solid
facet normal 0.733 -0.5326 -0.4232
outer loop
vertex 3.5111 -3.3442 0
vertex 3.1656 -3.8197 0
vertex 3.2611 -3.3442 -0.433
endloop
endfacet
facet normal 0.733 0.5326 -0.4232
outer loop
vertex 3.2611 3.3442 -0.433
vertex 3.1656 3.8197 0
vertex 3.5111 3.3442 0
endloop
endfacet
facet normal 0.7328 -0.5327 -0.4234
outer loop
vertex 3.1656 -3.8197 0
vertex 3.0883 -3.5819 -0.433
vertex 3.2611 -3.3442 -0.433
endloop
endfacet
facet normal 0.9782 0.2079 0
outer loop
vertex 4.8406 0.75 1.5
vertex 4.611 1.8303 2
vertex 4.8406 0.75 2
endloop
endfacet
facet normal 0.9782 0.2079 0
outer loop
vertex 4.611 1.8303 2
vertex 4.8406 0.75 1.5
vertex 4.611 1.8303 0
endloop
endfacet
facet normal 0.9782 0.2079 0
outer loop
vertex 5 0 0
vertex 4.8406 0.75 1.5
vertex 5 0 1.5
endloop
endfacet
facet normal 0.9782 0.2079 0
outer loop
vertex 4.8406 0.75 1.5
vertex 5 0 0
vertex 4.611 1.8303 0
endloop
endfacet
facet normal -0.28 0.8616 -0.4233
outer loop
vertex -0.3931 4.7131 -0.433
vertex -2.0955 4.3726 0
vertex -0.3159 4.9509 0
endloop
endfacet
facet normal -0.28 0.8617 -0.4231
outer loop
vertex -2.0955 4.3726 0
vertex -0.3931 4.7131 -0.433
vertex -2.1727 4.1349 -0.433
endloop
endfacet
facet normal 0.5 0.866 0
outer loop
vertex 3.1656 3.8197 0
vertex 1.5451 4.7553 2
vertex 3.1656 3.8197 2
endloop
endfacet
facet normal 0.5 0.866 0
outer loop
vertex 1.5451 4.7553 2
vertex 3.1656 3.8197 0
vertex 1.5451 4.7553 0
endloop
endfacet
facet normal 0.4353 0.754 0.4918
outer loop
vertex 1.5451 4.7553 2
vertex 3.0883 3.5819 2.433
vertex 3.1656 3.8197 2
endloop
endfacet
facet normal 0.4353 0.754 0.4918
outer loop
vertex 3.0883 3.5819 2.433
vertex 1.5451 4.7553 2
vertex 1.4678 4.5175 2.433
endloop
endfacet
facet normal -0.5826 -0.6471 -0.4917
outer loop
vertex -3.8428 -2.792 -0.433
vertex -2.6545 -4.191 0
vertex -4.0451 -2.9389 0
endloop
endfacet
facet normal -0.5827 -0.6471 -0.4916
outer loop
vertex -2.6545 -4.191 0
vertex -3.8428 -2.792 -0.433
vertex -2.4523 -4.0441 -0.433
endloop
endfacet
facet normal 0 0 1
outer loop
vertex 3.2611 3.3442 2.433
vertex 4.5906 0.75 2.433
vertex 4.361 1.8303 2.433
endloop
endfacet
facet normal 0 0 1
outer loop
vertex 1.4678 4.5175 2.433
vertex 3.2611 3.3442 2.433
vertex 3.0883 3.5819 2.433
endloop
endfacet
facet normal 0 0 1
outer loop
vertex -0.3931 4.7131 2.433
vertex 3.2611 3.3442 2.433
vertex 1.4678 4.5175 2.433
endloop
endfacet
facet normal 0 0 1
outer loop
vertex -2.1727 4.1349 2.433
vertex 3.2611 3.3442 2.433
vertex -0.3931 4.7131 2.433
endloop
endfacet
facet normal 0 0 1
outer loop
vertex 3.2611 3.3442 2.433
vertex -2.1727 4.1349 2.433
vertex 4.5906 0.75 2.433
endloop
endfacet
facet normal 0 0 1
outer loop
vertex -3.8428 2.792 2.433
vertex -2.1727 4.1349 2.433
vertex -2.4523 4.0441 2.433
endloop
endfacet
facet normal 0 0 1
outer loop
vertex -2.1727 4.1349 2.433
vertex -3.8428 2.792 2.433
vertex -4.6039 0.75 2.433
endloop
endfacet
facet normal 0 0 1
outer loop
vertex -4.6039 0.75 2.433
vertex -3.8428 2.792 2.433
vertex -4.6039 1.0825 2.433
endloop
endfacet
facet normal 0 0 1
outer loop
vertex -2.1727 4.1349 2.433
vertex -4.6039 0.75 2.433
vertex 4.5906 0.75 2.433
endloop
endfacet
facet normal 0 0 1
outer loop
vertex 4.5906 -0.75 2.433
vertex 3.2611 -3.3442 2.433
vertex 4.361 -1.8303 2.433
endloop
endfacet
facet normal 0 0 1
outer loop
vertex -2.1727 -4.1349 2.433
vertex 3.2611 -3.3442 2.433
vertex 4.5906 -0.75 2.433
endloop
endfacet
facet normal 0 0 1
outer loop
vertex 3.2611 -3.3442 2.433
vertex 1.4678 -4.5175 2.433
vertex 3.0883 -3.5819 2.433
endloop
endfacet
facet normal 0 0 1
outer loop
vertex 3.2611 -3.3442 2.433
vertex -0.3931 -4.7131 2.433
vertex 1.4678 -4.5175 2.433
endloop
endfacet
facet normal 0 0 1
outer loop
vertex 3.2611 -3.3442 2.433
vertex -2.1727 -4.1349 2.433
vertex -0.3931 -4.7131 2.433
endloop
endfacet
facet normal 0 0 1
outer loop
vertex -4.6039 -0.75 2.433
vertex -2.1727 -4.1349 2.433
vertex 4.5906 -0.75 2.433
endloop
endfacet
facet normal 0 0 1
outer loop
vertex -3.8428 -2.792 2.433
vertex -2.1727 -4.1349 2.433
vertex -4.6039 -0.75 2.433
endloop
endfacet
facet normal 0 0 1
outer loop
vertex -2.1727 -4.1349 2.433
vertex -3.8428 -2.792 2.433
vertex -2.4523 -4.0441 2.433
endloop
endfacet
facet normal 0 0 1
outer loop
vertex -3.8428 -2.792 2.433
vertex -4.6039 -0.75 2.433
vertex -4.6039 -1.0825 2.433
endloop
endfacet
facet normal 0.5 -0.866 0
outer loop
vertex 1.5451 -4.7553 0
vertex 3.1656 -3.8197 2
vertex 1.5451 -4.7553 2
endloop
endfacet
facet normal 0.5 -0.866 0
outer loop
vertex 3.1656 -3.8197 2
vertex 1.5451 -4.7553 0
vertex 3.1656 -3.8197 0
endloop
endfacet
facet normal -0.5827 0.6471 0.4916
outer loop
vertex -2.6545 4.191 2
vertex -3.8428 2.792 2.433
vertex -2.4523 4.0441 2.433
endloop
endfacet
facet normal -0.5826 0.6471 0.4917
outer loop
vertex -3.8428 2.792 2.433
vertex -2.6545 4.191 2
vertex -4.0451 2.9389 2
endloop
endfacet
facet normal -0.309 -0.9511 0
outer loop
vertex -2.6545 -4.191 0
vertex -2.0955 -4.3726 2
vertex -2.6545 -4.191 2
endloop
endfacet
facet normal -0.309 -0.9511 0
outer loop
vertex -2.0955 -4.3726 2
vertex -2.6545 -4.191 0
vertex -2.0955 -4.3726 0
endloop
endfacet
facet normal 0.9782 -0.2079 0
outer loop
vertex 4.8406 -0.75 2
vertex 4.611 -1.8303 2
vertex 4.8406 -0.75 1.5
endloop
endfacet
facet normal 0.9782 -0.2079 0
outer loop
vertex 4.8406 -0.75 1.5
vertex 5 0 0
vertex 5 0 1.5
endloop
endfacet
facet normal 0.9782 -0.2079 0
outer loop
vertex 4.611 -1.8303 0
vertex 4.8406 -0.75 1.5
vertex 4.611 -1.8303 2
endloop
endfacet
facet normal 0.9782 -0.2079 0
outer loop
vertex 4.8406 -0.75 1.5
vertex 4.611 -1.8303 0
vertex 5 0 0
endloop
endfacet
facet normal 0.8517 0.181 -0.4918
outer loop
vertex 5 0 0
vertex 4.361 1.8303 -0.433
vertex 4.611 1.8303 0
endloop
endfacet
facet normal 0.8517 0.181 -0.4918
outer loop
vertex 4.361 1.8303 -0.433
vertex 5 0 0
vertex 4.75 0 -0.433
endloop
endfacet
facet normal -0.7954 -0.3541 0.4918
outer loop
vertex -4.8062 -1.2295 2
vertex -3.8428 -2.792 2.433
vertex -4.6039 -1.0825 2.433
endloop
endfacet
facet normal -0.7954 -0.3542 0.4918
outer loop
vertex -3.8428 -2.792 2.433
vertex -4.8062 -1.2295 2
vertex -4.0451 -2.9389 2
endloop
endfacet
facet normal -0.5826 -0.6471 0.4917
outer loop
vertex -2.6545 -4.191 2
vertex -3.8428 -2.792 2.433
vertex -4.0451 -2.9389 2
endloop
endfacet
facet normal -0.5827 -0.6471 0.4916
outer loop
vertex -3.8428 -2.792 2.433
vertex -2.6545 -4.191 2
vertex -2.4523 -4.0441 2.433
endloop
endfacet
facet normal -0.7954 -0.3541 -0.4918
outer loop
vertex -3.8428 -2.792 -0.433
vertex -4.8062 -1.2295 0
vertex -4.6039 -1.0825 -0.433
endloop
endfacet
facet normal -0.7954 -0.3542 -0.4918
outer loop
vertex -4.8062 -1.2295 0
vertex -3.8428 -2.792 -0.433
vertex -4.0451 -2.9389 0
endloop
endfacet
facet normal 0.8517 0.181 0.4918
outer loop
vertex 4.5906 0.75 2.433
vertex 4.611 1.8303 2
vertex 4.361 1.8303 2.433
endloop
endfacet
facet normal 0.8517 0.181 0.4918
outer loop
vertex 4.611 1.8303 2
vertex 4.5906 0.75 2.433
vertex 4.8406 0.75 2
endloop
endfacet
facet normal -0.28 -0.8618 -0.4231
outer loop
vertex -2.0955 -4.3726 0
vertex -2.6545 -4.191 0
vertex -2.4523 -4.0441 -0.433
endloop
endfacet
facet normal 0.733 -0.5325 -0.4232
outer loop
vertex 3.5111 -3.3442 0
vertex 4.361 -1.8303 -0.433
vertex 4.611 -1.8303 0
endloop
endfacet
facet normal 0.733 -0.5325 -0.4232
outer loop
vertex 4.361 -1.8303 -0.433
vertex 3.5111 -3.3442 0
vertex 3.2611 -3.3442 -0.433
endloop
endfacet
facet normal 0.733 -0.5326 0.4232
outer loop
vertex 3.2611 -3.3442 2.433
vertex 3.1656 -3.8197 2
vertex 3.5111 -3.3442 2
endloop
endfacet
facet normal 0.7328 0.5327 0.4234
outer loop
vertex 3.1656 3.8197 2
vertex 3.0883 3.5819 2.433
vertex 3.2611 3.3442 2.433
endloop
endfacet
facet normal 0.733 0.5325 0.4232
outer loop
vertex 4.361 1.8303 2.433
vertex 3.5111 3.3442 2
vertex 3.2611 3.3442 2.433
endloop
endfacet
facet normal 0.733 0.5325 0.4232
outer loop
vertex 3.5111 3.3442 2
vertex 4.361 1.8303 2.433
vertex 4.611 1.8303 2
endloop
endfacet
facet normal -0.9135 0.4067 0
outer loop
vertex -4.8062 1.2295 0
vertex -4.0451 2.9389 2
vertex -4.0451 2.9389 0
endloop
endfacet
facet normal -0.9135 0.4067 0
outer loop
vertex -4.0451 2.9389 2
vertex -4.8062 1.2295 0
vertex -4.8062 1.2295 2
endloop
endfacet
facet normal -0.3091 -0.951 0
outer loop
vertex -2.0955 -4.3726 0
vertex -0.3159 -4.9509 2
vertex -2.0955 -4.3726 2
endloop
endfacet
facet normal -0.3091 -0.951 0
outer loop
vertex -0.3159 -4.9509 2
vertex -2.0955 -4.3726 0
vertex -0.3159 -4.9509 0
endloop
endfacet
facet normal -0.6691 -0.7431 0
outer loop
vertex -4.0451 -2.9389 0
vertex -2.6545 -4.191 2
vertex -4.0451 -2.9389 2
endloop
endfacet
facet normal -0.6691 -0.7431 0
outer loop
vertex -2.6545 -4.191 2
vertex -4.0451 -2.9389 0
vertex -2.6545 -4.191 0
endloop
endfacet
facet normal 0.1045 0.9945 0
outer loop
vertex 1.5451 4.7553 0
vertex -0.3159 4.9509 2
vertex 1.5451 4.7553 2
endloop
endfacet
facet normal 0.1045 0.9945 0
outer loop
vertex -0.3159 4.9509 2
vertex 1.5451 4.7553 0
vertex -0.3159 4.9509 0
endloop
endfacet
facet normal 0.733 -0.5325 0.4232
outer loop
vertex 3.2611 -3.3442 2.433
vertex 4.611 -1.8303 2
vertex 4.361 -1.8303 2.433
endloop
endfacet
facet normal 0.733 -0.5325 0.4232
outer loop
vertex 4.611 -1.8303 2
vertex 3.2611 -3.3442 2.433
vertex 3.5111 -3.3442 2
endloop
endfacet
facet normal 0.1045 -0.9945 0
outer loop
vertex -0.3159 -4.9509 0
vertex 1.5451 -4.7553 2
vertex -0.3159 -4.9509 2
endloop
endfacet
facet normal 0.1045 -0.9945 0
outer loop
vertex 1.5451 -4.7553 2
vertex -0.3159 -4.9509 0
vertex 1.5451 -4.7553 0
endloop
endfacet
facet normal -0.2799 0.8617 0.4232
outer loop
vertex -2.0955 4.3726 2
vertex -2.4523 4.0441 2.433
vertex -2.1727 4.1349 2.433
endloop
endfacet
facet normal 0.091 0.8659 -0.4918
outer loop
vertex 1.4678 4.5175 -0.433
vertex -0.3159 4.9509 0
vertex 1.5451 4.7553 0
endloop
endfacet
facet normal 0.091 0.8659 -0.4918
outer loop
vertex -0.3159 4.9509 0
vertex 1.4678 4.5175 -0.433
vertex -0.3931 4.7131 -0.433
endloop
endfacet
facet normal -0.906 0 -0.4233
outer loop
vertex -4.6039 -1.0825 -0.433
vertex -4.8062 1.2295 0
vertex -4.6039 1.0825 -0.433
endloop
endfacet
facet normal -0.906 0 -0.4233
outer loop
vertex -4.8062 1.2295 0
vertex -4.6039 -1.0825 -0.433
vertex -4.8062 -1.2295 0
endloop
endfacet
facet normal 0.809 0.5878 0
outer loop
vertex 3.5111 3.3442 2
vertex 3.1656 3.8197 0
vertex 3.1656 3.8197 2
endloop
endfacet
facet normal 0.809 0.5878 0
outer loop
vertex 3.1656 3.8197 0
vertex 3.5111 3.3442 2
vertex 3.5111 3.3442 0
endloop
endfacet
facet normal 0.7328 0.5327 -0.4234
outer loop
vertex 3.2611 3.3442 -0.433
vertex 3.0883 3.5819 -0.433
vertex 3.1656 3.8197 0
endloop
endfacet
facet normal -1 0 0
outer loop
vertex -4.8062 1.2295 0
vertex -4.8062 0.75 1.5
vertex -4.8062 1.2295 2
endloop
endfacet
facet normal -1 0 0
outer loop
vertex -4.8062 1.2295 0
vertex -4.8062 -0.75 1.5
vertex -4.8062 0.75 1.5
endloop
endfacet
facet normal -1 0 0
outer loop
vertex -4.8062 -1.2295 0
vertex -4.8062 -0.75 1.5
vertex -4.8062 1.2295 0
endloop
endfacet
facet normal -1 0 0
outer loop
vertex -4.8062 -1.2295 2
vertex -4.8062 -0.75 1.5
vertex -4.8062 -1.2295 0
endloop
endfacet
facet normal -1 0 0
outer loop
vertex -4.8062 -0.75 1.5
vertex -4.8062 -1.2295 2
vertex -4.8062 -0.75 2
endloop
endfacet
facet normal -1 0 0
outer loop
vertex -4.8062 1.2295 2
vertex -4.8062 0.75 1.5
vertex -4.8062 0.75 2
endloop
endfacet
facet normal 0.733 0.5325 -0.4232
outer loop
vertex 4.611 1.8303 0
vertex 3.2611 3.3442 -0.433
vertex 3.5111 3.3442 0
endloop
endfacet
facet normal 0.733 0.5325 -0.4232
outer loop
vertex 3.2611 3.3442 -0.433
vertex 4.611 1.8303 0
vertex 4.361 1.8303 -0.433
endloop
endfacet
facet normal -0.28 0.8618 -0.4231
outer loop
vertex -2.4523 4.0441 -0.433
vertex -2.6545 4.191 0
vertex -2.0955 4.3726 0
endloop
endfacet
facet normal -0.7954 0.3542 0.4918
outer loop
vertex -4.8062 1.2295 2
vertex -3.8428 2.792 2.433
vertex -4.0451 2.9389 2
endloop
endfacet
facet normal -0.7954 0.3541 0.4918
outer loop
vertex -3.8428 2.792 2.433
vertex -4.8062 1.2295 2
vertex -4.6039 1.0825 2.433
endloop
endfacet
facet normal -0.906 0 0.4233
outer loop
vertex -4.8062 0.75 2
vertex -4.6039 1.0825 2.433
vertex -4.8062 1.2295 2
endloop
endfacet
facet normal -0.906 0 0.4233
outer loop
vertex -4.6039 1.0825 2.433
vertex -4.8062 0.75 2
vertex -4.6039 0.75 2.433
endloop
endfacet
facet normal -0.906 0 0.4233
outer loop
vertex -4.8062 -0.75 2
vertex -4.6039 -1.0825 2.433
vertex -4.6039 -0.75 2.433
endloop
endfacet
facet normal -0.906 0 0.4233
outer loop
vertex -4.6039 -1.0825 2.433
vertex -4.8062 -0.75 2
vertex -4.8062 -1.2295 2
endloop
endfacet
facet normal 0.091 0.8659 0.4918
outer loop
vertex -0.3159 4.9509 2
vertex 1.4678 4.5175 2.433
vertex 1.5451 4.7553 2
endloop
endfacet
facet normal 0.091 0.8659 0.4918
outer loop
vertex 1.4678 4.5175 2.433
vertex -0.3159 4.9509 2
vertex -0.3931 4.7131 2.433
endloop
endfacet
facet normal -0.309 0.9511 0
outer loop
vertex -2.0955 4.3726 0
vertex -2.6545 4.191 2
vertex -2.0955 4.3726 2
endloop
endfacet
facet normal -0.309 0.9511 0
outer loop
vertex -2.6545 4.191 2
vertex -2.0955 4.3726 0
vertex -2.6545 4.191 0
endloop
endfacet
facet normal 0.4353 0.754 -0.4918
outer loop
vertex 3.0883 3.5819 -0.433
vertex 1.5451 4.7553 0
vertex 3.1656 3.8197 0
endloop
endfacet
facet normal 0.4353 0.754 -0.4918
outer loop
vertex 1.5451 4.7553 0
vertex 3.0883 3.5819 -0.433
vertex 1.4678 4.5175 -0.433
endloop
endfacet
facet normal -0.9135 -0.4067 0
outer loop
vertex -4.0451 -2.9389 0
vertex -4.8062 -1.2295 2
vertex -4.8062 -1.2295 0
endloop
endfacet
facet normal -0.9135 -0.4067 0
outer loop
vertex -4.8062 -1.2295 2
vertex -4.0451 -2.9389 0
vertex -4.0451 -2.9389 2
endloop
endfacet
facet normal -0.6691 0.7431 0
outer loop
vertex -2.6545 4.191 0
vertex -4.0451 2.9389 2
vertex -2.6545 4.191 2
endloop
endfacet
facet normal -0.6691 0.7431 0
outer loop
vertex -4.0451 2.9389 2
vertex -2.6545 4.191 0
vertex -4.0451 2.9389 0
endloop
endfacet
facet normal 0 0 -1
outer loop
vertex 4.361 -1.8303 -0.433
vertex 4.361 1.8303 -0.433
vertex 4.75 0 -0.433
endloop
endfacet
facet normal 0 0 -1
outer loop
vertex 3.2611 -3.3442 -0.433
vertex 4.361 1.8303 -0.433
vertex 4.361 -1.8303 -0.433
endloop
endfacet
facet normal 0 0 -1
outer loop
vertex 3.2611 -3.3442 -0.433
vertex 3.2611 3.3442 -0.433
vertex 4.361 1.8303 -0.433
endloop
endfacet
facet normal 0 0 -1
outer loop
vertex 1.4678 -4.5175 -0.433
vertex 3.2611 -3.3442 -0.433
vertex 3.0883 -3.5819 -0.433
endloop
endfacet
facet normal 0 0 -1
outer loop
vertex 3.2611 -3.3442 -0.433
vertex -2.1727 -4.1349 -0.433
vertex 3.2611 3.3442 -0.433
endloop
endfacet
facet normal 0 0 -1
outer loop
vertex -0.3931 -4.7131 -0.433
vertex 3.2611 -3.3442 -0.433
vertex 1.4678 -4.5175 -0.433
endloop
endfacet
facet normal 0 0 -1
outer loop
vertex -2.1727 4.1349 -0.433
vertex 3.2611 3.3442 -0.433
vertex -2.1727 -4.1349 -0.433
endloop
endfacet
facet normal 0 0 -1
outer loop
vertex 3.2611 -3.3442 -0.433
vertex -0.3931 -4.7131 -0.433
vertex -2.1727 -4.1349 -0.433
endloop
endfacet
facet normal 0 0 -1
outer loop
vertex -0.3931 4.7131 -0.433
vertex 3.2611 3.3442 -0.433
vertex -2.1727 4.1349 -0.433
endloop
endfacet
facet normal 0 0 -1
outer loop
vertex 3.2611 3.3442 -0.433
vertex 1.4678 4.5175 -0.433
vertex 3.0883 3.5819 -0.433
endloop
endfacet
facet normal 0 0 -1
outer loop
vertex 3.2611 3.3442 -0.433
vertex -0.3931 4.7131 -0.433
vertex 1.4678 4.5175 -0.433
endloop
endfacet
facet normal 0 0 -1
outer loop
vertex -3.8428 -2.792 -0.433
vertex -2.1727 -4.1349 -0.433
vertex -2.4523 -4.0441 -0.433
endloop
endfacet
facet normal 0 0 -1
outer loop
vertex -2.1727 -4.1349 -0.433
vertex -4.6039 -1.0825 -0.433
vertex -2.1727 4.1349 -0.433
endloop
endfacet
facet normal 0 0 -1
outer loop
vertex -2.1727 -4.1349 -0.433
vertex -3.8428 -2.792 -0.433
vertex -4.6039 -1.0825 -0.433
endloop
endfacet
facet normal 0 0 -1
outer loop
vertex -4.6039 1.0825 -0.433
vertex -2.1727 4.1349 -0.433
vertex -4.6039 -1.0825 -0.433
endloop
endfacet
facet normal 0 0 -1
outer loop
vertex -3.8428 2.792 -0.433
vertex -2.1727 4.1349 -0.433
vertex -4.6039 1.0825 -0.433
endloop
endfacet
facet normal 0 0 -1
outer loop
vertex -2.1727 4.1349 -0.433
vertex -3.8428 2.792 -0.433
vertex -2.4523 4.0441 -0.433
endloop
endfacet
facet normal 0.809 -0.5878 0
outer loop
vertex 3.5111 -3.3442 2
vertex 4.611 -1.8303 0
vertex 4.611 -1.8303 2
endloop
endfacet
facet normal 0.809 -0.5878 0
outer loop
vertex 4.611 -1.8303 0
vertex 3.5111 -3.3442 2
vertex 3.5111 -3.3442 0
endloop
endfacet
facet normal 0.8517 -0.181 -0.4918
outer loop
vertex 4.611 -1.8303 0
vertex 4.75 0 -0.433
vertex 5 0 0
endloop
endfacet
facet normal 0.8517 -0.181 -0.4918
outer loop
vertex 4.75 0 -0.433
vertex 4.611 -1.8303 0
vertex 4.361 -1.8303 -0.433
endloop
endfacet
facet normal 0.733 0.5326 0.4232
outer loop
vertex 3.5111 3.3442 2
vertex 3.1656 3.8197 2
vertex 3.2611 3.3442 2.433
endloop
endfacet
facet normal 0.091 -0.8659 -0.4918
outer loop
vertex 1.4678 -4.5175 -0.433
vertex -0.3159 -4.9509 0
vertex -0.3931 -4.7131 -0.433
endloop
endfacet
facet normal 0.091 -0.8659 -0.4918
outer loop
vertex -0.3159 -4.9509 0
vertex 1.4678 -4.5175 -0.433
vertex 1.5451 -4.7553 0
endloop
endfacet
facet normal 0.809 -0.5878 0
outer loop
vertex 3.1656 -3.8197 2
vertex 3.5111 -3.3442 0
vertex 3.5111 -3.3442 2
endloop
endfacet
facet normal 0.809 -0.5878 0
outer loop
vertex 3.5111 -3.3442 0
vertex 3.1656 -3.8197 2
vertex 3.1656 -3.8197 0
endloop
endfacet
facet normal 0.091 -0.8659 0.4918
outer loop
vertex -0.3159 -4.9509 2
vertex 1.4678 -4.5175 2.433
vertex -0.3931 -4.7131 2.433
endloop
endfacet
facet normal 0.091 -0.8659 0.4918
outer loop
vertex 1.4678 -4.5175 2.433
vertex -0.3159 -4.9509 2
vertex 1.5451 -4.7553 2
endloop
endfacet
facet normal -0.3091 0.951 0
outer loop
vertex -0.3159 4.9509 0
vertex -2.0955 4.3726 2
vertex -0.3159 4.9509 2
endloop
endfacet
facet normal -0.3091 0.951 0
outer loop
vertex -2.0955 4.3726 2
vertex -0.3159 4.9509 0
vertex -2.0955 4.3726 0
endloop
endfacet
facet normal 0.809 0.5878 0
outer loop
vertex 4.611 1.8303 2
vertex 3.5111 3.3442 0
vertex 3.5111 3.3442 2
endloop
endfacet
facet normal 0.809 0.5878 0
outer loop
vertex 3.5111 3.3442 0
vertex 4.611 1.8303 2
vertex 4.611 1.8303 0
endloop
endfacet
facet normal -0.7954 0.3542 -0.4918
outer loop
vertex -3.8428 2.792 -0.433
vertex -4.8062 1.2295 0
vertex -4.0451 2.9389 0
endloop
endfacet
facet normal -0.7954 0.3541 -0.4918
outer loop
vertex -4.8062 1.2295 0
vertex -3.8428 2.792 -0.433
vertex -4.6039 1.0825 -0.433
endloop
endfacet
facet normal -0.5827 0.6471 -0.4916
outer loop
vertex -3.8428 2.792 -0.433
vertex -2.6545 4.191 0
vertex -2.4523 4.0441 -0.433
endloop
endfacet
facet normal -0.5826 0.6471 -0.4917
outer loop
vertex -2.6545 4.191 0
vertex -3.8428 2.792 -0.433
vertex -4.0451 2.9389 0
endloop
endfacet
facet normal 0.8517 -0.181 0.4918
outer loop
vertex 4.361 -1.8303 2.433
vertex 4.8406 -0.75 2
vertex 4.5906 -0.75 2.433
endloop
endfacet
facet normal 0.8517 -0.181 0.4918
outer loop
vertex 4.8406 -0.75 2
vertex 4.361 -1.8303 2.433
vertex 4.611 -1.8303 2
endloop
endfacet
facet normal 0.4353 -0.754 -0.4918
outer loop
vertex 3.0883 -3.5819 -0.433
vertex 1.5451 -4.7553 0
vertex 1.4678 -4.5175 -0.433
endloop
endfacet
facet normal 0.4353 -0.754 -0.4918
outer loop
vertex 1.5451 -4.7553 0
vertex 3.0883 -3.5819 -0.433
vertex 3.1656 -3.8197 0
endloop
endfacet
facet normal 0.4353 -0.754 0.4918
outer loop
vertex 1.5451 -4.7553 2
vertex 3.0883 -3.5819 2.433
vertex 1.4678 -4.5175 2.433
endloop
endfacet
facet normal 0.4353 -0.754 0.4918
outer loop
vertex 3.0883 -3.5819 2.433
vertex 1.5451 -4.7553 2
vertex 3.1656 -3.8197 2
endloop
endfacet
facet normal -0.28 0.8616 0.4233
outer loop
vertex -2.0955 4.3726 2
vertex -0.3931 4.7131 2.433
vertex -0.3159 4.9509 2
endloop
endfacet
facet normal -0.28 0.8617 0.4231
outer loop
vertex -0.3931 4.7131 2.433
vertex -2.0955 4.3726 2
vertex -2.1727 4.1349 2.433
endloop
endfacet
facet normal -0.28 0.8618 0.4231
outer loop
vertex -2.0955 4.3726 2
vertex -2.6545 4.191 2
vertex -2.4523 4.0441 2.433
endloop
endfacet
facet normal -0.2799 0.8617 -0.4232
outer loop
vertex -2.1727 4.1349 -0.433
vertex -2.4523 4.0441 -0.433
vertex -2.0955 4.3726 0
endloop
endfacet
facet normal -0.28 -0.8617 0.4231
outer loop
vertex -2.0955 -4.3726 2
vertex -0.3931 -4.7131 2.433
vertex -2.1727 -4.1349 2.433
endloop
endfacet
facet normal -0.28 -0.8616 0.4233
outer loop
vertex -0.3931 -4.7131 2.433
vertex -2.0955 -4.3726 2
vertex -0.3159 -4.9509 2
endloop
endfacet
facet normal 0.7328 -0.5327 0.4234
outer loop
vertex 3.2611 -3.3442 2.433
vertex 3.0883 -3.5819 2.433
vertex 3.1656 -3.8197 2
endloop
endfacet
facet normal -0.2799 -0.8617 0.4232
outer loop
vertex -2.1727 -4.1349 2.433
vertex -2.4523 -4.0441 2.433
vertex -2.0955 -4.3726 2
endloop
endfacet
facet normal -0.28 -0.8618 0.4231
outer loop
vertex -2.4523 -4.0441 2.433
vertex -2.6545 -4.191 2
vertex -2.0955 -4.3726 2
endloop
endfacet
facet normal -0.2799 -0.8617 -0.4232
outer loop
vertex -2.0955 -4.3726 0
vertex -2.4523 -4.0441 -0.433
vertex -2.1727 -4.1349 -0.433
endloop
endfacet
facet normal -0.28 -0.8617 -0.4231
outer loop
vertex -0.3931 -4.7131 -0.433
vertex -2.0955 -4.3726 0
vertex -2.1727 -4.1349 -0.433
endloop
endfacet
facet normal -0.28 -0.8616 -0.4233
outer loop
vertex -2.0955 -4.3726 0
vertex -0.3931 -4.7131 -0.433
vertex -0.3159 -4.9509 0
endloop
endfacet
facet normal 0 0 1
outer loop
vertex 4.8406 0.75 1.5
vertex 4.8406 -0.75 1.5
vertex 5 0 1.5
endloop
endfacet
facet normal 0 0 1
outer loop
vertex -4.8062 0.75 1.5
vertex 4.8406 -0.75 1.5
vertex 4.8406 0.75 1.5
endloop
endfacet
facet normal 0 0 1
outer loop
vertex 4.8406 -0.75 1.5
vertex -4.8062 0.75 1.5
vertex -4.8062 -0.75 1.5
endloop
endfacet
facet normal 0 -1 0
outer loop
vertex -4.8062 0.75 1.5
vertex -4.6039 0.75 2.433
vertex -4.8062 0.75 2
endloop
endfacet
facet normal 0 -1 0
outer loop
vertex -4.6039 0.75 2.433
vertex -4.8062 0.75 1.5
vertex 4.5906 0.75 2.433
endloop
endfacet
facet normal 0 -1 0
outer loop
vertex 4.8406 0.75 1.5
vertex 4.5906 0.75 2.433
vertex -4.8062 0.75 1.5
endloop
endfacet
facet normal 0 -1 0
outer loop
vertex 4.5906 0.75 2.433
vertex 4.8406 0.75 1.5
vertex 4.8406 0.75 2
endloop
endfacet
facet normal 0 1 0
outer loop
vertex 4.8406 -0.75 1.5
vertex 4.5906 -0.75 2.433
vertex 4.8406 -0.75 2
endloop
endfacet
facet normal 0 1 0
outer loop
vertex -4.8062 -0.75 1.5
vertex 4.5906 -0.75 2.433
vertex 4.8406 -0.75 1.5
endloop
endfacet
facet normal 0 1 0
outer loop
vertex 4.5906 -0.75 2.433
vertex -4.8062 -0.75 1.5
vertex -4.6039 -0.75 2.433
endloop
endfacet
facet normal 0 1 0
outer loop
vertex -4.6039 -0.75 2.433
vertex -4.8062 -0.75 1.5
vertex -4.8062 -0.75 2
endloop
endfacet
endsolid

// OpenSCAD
// studs/screw_head.scad — flat round disc with a slot. Industrial look.
// MIT licensed.

module stud_screw_head(size = 6, tip_radius = 0.4, height = undef) {
    h         = is_undef(height) ? size * 0.25 : height;
    slot_w    = size * 0.15;
    slot_d    = h * 0.4;
    fillet    = min(tip_radius, h * 0.3);

    difference() {
        // disc with a small chamfered top edge if tip_radius > 0
        if (fillet > 0) {
            minkowski() {
                cylinder(h = h - fillet, r = size / 2 - fillet);
                sphere(r = fillet);
            }
        } else {
            cylinder(h = h, r = size / 2);
        }
        // slot
        translate([-size / 2, -slot_w / 2, h - slot_d])
            cube([size, slot_w, slot_d + 0.1]);
    }
}

stud_screw_head(size = 10, tip_radius = 0.5);
